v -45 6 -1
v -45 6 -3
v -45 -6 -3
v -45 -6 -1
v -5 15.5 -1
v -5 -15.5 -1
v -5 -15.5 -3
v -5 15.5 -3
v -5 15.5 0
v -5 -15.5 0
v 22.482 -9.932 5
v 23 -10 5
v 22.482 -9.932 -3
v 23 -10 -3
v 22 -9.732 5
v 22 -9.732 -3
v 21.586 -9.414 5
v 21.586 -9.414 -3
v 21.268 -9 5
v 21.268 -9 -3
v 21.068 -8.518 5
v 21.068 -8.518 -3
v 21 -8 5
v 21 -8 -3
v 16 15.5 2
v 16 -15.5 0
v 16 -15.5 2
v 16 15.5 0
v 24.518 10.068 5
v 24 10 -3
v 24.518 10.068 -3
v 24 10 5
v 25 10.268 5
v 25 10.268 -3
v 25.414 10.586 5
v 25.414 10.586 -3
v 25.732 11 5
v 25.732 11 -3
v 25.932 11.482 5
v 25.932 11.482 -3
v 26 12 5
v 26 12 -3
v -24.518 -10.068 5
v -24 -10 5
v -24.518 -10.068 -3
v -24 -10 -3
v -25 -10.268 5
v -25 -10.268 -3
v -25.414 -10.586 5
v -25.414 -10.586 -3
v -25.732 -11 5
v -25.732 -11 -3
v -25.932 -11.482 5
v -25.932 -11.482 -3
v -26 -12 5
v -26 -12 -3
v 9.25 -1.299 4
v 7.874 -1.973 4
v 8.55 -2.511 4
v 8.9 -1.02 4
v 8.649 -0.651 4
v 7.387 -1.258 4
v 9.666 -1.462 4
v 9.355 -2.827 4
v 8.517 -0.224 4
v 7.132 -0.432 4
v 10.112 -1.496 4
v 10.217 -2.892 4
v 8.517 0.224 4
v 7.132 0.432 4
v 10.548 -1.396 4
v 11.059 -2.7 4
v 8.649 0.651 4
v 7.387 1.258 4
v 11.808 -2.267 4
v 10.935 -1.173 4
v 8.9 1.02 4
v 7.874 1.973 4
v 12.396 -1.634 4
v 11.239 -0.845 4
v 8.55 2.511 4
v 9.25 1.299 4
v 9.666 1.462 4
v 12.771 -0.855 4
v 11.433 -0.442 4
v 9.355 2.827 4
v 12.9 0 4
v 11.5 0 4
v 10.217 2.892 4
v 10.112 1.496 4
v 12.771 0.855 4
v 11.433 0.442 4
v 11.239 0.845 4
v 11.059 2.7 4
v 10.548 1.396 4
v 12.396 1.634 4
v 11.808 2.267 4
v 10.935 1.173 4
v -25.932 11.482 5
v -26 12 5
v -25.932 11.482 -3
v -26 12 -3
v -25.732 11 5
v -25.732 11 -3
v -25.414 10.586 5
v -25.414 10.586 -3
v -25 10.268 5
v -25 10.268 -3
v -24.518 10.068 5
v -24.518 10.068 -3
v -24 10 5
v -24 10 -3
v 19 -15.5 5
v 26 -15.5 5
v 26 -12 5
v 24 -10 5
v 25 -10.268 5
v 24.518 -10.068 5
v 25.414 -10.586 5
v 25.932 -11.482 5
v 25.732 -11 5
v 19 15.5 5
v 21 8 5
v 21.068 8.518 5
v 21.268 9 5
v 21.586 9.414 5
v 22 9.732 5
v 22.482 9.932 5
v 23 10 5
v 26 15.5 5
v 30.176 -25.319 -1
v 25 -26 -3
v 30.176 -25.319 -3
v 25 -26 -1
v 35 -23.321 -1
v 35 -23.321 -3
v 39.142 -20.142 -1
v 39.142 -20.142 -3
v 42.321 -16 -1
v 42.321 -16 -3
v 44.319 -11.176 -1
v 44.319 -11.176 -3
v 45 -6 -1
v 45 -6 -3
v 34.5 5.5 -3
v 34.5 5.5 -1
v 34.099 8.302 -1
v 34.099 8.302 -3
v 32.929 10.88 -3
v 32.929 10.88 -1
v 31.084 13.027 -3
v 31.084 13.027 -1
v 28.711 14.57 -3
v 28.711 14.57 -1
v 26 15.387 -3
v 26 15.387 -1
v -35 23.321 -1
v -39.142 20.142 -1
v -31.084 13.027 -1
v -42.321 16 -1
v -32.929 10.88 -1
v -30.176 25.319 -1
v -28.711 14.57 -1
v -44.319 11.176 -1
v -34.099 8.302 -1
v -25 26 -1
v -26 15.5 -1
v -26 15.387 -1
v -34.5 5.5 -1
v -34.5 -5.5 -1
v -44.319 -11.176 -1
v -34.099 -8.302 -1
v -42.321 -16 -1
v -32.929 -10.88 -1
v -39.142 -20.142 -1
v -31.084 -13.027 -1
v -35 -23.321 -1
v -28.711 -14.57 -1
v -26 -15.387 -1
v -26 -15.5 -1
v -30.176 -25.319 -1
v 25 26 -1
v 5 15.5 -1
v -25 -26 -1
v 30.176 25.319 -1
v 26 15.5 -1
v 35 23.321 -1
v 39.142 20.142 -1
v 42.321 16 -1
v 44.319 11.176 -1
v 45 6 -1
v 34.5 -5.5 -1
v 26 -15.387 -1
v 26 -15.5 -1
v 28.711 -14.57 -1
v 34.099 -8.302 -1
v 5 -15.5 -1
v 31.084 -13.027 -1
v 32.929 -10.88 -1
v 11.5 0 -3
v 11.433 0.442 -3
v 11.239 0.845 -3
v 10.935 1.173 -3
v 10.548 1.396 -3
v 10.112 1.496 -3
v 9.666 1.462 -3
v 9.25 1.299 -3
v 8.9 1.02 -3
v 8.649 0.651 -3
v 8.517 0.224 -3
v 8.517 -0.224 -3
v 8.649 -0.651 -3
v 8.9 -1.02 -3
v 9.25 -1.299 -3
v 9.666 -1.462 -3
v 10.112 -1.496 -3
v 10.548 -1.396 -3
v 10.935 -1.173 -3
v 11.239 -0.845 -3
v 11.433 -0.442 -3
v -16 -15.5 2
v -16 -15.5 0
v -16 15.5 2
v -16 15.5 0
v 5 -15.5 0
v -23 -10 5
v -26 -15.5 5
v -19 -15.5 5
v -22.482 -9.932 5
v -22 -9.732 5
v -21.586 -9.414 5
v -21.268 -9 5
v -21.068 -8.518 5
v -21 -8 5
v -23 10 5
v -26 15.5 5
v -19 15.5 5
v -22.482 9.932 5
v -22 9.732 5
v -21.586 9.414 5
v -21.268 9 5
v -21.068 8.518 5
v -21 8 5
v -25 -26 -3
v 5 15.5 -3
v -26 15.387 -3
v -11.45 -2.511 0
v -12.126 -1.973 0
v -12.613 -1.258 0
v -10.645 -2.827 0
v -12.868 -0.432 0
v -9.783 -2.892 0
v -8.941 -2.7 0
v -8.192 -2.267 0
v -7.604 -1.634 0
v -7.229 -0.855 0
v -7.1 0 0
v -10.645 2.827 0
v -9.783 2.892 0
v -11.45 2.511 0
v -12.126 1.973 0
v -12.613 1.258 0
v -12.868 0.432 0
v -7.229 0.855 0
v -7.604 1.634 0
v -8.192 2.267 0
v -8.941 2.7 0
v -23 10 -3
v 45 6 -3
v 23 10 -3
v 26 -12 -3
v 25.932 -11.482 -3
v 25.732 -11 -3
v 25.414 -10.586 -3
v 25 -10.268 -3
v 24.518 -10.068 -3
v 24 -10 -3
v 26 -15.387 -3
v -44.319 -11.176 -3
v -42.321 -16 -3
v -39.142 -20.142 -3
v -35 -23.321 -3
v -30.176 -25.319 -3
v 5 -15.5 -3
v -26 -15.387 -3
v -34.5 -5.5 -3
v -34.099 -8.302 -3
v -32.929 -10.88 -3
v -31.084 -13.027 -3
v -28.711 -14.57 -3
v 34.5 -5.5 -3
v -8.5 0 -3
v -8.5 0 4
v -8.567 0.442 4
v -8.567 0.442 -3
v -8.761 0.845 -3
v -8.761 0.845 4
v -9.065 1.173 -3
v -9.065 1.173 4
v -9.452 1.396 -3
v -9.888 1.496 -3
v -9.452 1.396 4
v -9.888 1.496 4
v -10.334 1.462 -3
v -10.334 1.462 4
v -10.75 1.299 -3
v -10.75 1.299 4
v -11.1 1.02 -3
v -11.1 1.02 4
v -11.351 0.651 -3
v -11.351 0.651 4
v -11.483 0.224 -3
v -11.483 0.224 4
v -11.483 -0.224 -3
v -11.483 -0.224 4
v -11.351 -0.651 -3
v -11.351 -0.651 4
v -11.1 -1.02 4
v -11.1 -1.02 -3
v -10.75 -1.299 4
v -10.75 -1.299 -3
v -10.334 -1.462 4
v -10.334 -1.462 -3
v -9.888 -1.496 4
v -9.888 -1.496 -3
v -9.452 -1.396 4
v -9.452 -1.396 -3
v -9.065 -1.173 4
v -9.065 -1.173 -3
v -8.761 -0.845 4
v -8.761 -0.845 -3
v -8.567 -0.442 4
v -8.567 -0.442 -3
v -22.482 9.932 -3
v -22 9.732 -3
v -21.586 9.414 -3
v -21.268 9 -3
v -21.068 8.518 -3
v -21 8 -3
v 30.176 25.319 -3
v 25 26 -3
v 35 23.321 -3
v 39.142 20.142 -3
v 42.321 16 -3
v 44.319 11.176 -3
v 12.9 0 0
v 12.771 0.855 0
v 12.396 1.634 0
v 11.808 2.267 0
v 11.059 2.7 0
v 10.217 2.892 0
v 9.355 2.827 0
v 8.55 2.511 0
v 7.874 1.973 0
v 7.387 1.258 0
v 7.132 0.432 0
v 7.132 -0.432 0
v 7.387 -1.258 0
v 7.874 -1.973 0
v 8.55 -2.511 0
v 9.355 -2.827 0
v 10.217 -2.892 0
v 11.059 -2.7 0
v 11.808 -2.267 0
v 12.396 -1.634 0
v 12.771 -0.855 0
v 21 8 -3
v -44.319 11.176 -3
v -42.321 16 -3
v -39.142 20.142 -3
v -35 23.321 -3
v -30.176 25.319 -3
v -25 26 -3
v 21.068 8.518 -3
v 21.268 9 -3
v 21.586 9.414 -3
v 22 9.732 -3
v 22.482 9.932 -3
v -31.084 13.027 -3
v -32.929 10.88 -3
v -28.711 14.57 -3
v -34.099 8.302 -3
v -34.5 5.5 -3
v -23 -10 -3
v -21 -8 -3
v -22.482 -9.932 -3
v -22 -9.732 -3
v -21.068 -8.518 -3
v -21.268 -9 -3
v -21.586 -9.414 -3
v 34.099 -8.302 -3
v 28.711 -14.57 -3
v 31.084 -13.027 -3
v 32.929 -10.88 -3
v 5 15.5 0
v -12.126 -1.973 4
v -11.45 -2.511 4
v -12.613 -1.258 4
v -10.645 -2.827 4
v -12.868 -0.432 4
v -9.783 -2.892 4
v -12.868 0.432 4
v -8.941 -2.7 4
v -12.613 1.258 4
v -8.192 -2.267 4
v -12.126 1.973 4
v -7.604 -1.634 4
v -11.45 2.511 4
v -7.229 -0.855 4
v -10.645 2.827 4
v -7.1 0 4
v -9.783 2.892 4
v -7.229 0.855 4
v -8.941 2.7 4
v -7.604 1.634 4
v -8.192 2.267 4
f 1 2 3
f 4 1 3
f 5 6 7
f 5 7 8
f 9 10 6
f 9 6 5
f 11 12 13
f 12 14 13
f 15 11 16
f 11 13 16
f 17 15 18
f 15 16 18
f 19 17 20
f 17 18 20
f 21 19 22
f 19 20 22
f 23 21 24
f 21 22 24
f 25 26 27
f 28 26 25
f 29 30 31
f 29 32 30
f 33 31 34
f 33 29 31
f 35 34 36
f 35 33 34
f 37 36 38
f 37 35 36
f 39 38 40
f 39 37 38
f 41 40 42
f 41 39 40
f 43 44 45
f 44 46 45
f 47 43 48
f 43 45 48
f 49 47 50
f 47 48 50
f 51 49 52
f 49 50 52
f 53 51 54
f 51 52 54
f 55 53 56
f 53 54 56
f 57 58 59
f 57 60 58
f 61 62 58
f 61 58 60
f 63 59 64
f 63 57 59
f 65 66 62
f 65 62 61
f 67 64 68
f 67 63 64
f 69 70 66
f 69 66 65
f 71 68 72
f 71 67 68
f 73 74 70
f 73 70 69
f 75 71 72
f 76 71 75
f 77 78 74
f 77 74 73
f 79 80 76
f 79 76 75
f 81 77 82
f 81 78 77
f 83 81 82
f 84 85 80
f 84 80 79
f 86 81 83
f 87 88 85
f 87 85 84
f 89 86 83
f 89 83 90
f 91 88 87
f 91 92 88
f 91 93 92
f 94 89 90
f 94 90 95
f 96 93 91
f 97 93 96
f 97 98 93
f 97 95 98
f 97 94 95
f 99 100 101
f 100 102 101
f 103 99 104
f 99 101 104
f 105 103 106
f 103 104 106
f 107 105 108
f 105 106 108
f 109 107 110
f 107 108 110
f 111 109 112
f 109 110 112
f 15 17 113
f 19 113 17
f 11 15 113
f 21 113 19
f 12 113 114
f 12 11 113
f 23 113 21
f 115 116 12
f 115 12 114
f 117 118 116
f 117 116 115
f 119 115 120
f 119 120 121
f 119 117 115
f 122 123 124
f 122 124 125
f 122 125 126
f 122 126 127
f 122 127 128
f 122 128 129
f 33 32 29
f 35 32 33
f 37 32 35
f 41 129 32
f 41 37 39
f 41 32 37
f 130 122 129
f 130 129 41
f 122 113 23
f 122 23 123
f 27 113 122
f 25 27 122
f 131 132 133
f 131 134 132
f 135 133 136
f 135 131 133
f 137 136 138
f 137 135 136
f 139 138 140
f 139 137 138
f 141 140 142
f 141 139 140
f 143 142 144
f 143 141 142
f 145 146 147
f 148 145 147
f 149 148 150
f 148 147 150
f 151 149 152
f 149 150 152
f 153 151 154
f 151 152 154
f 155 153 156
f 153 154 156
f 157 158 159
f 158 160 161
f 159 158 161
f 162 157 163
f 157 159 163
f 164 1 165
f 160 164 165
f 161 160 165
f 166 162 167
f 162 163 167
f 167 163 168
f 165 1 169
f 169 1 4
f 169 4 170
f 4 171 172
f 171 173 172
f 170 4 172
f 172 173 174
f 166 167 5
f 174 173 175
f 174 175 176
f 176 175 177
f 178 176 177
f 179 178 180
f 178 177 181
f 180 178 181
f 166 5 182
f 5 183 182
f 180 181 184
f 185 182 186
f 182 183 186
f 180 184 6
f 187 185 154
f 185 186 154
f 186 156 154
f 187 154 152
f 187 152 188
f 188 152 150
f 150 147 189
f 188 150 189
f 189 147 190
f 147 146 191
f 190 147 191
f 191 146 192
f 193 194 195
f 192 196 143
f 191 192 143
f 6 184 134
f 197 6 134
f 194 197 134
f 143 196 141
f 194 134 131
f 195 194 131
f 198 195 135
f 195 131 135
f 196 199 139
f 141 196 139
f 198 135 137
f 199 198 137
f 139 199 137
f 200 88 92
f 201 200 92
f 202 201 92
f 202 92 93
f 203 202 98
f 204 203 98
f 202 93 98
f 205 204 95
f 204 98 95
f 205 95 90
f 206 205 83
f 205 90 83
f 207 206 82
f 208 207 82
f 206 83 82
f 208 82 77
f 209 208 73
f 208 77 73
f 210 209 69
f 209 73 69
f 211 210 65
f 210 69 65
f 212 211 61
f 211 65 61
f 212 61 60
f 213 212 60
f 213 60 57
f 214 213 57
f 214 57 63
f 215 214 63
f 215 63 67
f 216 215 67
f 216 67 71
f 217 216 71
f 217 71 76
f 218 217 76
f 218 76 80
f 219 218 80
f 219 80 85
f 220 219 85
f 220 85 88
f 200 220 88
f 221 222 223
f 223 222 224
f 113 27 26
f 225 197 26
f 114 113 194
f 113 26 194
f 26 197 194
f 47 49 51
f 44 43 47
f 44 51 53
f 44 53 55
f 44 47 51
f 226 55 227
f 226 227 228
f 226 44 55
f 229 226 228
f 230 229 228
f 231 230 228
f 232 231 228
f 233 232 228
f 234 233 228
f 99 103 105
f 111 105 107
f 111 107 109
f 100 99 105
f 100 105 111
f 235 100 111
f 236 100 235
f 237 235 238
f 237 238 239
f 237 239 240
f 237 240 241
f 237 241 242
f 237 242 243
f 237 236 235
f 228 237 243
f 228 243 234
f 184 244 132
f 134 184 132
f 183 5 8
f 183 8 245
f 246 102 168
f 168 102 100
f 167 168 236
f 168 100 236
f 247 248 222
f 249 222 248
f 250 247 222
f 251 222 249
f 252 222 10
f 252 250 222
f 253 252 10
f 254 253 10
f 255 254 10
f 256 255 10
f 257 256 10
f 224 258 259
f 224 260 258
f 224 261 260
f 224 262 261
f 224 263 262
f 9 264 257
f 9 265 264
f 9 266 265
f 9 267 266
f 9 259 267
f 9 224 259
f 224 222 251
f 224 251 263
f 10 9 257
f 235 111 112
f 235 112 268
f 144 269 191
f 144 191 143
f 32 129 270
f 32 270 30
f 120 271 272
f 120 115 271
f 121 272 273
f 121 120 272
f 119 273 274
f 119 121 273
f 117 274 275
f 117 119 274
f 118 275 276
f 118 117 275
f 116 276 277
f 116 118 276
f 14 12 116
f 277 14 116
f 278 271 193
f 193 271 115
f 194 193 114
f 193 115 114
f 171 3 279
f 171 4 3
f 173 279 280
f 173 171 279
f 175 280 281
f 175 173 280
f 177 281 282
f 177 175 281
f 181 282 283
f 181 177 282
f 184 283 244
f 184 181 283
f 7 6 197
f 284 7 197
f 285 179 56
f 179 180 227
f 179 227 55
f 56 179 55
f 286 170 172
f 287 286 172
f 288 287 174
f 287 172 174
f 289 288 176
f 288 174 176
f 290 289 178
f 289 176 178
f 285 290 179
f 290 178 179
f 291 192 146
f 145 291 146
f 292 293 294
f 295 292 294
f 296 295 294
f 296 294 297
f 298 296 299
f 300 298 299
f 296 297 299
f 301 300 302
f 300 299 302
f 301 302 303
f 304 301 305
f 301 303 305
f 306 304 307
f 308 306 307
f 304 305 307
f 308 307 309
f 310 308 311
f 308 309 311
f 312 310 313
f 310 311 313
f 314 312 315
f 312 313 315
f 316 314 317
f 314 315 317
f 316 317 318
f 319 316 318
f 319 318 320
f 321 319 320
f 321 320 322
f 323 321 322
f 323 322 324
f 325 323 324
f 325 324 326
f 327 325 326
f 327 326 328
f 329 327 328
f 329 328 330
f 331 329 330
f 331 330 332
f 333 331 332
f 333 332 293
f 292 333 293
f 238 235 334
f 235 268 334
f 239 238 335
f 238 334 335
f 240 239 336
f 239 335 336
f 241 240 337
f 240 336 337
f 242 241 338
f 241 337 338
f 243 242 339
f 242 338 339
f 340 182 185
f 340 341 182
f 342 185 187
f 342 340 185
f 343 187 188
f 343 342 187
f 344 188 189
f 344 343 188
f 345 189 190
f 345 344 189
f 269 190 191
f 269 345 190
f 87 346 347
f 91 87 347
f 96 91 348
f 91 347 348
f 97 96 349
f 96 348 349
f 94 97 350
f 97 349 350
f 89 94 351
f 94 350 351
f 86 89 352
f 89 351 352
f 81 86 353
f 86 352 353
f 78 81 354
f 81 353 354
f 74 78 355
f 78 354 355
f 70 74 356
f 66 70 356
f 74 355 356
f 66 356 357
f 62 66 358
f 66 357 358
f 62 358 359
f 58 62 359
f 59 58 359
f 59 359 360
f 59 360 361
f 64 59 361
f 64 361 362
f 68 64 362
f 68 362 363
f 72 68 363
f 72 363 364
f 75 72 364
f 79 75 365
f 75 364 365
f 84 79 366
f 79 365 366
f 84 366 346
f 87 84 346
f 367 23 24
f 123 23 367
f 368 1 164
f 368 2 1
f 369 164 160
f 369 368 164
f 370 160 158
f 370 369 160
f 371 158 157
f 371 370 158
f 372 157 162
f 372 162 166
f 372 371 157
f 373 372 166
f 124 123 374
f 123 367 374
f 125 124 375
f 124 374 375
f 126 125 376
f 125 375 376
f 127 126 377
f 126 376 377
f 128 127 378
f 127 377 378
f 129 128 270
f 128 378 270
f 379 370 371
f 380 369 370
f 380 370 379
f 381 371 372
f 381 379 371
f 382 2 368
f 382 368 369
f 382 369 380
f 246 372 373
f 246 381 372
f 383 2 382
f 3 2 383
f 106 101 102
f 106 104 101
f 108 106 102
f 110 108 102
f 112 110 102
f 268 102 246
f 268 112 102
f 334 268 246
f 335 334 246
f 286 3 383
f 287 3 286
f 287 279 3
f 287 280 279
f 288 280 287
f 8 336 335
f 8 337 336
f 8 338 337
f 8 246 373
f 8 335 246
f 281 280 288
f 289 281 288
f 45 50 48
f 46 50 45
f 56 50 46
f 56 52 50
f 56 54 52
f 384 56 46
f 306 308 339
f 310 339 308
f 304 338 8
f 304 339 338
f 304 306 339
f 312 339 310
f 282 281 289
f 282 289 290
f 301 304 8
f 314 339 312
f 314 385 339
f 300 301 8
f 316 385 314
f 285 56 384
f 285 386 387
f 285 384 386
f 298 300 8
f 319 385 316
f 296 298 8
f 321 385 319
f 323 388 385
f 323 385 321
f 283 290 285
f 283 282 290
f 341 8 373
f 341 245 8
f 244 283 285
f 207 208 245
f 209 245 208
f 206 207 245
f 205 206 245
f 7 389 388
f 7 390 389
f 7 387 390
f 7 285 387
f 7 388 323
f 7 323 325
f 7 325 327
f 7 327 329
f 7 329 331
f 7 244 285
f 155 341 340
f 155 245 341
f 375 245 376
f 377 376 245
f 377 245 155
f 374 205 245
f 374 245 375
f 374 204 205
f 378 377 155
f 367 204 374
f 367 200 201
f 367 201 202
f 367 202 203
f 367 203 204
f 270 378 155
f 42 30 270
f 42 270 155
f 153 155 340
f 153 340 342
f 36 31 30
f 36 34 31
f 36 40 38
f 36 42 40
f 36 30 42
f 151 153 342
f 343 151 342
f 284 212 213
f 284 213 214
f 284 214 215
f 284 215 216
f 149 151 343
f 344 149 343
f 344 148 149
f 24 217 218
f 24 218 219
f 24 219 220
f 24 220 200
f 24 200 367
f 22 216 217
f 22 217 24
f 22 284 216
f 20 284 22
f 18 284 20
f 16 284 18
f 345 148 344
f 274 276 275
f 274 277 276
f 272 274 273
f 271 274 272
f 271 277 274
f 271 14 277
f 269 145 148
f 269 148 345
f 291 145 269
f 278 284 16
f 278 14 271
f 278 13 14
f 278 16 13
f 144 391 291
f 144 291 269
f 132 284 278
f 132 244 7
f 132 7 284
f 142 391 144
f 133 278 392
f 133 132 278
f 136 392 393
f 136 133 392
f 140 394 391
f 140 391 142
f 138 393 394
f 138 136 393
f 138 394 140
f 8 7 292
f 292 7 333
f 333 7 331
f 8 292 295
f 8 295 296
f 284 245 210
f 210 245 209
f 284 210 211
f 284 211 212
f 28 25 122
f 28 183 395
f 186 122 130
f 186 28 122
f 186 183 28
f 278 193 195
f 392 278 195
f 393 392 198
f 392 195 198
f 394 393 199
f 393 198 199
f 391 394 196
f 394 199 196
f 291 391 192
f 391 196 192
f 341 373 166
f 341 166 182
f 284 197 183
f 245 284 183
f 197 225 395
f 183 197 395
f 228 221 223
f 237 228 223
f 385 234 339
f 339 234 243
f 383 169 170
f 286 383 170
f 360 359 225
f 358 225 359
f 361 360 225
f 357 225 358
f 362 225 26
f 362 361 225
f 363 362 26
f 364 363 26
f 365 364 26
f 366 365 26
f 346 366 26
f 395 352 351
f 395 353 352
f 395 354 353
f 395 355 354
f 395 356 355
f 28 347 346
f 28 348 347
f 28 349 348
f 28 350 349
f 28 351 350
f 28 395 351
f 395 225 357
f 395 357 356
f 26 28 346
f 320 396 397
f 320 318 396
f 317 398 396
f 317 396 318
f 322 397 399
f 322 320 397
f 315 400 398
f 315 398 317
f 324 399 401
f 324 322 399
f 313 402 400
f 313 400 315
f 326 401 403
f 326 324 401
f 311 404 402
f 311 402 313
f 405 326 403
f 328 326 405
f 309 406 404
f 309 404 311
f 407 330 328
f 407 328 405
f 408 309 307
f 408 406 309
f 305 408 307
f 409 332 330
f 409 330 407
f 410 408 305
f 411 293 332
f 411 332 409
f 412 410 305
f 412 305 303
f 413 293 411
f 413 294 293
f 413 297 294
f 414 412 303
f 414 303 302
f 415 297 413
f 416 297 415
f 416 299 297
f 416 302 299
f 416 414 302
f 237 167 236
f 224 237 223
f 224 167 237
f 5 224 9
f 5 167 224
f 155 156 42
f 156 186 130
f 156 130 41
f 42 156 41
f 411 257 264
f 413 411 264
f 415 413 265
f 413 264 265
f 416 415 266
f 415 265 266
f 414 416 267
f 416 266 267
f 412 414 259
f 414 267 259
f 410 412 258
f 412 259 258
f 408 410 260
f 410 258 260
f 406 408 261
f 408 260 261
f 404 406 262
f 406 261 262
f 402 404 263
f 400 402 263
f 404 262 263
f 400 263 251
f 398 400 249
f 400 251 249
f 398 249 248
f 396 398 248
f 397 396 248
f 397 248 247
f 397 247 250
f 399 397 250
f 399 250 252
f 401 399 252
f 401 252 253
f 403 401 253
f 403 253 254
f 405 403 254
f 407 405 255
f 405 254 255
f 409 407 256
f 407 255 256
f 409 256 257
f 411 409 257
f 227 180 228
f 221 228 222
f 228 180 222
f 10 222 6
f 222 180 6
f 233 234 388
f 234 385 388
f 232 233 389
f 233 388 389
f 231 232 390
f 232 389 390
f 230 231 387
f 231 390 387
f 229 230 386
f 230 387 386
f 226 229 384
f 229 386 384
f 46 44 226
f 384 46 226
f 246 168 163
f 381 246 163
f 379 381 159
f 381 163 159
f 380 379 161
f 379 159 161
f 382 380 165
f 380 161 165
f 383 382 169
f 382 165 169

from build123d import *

# Parameters (mm, degrees)
F0_W          = 52
F0_H          = 31
F1_DEPTH      = 3
F2_W          = 10
F2_H          = 31
F3_DEPTH      = 5
F4_SIZE       = 3
F5_R          = 2.9
F6_DEPTH      = 4
F7_W          = 90
F7_H          = 52
F8_DEPTH      = 2
F8_DEPTH_BACK = 1
F9_DEPTH      = 1
F10_DEPTH     = 2
F11_R         = 20
F12_R         = 1.5
F13_DEPTH     = 25
F14_R         = 1.5
F15_DEPTH     = 25
F17_DEPTH     = 25
F18_W         = 10
F18_H         = 31
F19_DEPTH     = 25
F20_W         = 10
F20_H         = 20
F21_DEPTH     = 25
F22_W         = 10
F22_H         = 20
F23_DEPTH     = 25
F24_R         = 2


with BuildPart() as f1:
    # F0 (on Top) → F1 (new body)
    with BuildSketch(Plane.XY):
        Rectangle(F0_W, F0_H)
    extrude(amount=-F1_DEPTH)

    # F2 (on face) → F3 (join)
    with BuildSketch(Plane.XY):
        with Locations((21, 0)):
            Rectangle(F2_W, F2_H)
        with Locations((-21, 0)):
            Rectangle(F2_W, F2_H)
    extrude(amount=F3_DEPTH)

    # F4
    f4_edges = [f1.edges().sort_by_distance(p)[0] for p in [
        (-16, 0, 5),
        (16, 0, 5),
    ]]
    chamfer(f4_edges, length=F4_SIZE)

    # F5 (on face) → F6 (join)
    with BuildSketch(Plane.XY):
        with Locations((-10, 0)):
            Circle(F5_R)
        with Locations((10, 0)):
            Circle(F5_R)
    extrude(amount=F6_DEPTH)

    # F7 (on face) → F8 (join, two sides)
    with BuildSketch(Plane(origin=(0, 0, -3), x_dir=(1, 0, 0), z_dir=(0, 0, -1))) as f8_sk:
        Rectangle(F7_W, F7_H)
    extrude(amount=F8_DEPTH)
    extrude(f8_sk.sketch, amount=-F8_DEPTH_BACK)

    # F9 (add): a face of the model
    f9_faces = [f1.faces().sort_by_distance(p)[0] for p in [
        (43.9605770832, 0, -2),
    ]]
    extrude(f9_faces, amount=F9_DEPTH)

    # F10 (cut): a face of the model
    f10_faces = [f1.faces().sort_by_distance(p)[0] for p in [
        (0, 0, -5),
    ]]
    extrude(f10_faces, amount=-F10_DEPTH, mode=Mode.SUBTRACT)

    # F11
    f11_edges = [f1.edges().sort_by_distance(p)[0] for p in [
        (45, 26, -2),
        (-45, 26, -2),
        (-45, -26, -2),
        (45, -26, -2),
    ]]
    fillet(f11_edges, radius=F11_R)

    # F12 (on face) → F13 (cut)
    with BuildSketch(Plane.XY.offset(4)):
        with Locations((-10, 0)):
            Circle(F12_R)
    extrude(amount=-F13_DEPTH, mode=Mode.SUBTRACT)

    # F14 (on face) → F15 (cut)
    with BuildSketch(Plane.XY.offset(4)):
        with Locations((10, 0)):
            Circle(F14_R)
    extrude(amount=-F15_DEPTH, mode=Mode.SUBTRACT)

    # F16 (on face) → F17 (cut)
    with BuildSketch(Plane.XY.offset(-1)):
        with BuildLine():
            Line((26, 15.3868599666), (26, -15.3868599666))
            ThreePointArc((26, -15.3868599666), (32.0828754441, -12.0192024052), (34.5, -5.5))
            Line((34.5, -5.5), (34.5, 5.5))
            ThreePointArc((34.5, 5.5), (32.0828754441, 12.0192024052), (26, 15.3868599666))
        make_face()
        with BuildLine():
            ThreePointArc((-34.5, -5.5), (-32.0828754441, -12.0192024052), (-26, -15.3868599666))
            Line((-26, -15.3868599666), (-26, 15.3868599666))
            ThreePointArc((-26, 15.3868599666), (-32.0828754441, 12.0192024052), (-34.5, 5.5))
            Line((-34.5, 5.5), (-34.5, -5.5))
        make_face()
    extrude(amount=-F17_DEPTH, mode=Mode.SUBTRACT)

    # F18 (on face) → F19 (cut)
    with BuildSketch(Plane.XY):
        Rectangle(F18_W, F18_H)
    extrude(amount=-F19_DEPTH, mode=Mode.SUBTRACT)

    # F20 (on face) → F21 (cut)
    with BuildSketch(Plane.XY.offset(5)):
        with Locations((26, 0)):
            Rectangle(F20_W, F20_H)
    extrude(amount=-F21_DEPTH, mode=Mode.SUBTRACT)

    # F22 (on face) → F23 (cut)
    with BuildSketch(Plane.XY.offset(5)):
        with Locations((-26, 0)):
            Rectangle(F22_W, F22_H)
    extrude(amount=-F23_DEPTH, mode=Mode.SUBTRACT)

    # F24
    f24_edges = [f1.edges().sort_by_distance(p)[0] for p in [
        (21, 10, 1),
        (21, -10, 1),
        (-21, 10, 1),
        (-21, -10, 1),
        (-26, -10, 1),
        (-26, 10, 1),
        (26, 10, 1),
        (26, -10, 1),
    ]]
    fillet(f24_edges, radius=F24_R)


solid = f1.part
